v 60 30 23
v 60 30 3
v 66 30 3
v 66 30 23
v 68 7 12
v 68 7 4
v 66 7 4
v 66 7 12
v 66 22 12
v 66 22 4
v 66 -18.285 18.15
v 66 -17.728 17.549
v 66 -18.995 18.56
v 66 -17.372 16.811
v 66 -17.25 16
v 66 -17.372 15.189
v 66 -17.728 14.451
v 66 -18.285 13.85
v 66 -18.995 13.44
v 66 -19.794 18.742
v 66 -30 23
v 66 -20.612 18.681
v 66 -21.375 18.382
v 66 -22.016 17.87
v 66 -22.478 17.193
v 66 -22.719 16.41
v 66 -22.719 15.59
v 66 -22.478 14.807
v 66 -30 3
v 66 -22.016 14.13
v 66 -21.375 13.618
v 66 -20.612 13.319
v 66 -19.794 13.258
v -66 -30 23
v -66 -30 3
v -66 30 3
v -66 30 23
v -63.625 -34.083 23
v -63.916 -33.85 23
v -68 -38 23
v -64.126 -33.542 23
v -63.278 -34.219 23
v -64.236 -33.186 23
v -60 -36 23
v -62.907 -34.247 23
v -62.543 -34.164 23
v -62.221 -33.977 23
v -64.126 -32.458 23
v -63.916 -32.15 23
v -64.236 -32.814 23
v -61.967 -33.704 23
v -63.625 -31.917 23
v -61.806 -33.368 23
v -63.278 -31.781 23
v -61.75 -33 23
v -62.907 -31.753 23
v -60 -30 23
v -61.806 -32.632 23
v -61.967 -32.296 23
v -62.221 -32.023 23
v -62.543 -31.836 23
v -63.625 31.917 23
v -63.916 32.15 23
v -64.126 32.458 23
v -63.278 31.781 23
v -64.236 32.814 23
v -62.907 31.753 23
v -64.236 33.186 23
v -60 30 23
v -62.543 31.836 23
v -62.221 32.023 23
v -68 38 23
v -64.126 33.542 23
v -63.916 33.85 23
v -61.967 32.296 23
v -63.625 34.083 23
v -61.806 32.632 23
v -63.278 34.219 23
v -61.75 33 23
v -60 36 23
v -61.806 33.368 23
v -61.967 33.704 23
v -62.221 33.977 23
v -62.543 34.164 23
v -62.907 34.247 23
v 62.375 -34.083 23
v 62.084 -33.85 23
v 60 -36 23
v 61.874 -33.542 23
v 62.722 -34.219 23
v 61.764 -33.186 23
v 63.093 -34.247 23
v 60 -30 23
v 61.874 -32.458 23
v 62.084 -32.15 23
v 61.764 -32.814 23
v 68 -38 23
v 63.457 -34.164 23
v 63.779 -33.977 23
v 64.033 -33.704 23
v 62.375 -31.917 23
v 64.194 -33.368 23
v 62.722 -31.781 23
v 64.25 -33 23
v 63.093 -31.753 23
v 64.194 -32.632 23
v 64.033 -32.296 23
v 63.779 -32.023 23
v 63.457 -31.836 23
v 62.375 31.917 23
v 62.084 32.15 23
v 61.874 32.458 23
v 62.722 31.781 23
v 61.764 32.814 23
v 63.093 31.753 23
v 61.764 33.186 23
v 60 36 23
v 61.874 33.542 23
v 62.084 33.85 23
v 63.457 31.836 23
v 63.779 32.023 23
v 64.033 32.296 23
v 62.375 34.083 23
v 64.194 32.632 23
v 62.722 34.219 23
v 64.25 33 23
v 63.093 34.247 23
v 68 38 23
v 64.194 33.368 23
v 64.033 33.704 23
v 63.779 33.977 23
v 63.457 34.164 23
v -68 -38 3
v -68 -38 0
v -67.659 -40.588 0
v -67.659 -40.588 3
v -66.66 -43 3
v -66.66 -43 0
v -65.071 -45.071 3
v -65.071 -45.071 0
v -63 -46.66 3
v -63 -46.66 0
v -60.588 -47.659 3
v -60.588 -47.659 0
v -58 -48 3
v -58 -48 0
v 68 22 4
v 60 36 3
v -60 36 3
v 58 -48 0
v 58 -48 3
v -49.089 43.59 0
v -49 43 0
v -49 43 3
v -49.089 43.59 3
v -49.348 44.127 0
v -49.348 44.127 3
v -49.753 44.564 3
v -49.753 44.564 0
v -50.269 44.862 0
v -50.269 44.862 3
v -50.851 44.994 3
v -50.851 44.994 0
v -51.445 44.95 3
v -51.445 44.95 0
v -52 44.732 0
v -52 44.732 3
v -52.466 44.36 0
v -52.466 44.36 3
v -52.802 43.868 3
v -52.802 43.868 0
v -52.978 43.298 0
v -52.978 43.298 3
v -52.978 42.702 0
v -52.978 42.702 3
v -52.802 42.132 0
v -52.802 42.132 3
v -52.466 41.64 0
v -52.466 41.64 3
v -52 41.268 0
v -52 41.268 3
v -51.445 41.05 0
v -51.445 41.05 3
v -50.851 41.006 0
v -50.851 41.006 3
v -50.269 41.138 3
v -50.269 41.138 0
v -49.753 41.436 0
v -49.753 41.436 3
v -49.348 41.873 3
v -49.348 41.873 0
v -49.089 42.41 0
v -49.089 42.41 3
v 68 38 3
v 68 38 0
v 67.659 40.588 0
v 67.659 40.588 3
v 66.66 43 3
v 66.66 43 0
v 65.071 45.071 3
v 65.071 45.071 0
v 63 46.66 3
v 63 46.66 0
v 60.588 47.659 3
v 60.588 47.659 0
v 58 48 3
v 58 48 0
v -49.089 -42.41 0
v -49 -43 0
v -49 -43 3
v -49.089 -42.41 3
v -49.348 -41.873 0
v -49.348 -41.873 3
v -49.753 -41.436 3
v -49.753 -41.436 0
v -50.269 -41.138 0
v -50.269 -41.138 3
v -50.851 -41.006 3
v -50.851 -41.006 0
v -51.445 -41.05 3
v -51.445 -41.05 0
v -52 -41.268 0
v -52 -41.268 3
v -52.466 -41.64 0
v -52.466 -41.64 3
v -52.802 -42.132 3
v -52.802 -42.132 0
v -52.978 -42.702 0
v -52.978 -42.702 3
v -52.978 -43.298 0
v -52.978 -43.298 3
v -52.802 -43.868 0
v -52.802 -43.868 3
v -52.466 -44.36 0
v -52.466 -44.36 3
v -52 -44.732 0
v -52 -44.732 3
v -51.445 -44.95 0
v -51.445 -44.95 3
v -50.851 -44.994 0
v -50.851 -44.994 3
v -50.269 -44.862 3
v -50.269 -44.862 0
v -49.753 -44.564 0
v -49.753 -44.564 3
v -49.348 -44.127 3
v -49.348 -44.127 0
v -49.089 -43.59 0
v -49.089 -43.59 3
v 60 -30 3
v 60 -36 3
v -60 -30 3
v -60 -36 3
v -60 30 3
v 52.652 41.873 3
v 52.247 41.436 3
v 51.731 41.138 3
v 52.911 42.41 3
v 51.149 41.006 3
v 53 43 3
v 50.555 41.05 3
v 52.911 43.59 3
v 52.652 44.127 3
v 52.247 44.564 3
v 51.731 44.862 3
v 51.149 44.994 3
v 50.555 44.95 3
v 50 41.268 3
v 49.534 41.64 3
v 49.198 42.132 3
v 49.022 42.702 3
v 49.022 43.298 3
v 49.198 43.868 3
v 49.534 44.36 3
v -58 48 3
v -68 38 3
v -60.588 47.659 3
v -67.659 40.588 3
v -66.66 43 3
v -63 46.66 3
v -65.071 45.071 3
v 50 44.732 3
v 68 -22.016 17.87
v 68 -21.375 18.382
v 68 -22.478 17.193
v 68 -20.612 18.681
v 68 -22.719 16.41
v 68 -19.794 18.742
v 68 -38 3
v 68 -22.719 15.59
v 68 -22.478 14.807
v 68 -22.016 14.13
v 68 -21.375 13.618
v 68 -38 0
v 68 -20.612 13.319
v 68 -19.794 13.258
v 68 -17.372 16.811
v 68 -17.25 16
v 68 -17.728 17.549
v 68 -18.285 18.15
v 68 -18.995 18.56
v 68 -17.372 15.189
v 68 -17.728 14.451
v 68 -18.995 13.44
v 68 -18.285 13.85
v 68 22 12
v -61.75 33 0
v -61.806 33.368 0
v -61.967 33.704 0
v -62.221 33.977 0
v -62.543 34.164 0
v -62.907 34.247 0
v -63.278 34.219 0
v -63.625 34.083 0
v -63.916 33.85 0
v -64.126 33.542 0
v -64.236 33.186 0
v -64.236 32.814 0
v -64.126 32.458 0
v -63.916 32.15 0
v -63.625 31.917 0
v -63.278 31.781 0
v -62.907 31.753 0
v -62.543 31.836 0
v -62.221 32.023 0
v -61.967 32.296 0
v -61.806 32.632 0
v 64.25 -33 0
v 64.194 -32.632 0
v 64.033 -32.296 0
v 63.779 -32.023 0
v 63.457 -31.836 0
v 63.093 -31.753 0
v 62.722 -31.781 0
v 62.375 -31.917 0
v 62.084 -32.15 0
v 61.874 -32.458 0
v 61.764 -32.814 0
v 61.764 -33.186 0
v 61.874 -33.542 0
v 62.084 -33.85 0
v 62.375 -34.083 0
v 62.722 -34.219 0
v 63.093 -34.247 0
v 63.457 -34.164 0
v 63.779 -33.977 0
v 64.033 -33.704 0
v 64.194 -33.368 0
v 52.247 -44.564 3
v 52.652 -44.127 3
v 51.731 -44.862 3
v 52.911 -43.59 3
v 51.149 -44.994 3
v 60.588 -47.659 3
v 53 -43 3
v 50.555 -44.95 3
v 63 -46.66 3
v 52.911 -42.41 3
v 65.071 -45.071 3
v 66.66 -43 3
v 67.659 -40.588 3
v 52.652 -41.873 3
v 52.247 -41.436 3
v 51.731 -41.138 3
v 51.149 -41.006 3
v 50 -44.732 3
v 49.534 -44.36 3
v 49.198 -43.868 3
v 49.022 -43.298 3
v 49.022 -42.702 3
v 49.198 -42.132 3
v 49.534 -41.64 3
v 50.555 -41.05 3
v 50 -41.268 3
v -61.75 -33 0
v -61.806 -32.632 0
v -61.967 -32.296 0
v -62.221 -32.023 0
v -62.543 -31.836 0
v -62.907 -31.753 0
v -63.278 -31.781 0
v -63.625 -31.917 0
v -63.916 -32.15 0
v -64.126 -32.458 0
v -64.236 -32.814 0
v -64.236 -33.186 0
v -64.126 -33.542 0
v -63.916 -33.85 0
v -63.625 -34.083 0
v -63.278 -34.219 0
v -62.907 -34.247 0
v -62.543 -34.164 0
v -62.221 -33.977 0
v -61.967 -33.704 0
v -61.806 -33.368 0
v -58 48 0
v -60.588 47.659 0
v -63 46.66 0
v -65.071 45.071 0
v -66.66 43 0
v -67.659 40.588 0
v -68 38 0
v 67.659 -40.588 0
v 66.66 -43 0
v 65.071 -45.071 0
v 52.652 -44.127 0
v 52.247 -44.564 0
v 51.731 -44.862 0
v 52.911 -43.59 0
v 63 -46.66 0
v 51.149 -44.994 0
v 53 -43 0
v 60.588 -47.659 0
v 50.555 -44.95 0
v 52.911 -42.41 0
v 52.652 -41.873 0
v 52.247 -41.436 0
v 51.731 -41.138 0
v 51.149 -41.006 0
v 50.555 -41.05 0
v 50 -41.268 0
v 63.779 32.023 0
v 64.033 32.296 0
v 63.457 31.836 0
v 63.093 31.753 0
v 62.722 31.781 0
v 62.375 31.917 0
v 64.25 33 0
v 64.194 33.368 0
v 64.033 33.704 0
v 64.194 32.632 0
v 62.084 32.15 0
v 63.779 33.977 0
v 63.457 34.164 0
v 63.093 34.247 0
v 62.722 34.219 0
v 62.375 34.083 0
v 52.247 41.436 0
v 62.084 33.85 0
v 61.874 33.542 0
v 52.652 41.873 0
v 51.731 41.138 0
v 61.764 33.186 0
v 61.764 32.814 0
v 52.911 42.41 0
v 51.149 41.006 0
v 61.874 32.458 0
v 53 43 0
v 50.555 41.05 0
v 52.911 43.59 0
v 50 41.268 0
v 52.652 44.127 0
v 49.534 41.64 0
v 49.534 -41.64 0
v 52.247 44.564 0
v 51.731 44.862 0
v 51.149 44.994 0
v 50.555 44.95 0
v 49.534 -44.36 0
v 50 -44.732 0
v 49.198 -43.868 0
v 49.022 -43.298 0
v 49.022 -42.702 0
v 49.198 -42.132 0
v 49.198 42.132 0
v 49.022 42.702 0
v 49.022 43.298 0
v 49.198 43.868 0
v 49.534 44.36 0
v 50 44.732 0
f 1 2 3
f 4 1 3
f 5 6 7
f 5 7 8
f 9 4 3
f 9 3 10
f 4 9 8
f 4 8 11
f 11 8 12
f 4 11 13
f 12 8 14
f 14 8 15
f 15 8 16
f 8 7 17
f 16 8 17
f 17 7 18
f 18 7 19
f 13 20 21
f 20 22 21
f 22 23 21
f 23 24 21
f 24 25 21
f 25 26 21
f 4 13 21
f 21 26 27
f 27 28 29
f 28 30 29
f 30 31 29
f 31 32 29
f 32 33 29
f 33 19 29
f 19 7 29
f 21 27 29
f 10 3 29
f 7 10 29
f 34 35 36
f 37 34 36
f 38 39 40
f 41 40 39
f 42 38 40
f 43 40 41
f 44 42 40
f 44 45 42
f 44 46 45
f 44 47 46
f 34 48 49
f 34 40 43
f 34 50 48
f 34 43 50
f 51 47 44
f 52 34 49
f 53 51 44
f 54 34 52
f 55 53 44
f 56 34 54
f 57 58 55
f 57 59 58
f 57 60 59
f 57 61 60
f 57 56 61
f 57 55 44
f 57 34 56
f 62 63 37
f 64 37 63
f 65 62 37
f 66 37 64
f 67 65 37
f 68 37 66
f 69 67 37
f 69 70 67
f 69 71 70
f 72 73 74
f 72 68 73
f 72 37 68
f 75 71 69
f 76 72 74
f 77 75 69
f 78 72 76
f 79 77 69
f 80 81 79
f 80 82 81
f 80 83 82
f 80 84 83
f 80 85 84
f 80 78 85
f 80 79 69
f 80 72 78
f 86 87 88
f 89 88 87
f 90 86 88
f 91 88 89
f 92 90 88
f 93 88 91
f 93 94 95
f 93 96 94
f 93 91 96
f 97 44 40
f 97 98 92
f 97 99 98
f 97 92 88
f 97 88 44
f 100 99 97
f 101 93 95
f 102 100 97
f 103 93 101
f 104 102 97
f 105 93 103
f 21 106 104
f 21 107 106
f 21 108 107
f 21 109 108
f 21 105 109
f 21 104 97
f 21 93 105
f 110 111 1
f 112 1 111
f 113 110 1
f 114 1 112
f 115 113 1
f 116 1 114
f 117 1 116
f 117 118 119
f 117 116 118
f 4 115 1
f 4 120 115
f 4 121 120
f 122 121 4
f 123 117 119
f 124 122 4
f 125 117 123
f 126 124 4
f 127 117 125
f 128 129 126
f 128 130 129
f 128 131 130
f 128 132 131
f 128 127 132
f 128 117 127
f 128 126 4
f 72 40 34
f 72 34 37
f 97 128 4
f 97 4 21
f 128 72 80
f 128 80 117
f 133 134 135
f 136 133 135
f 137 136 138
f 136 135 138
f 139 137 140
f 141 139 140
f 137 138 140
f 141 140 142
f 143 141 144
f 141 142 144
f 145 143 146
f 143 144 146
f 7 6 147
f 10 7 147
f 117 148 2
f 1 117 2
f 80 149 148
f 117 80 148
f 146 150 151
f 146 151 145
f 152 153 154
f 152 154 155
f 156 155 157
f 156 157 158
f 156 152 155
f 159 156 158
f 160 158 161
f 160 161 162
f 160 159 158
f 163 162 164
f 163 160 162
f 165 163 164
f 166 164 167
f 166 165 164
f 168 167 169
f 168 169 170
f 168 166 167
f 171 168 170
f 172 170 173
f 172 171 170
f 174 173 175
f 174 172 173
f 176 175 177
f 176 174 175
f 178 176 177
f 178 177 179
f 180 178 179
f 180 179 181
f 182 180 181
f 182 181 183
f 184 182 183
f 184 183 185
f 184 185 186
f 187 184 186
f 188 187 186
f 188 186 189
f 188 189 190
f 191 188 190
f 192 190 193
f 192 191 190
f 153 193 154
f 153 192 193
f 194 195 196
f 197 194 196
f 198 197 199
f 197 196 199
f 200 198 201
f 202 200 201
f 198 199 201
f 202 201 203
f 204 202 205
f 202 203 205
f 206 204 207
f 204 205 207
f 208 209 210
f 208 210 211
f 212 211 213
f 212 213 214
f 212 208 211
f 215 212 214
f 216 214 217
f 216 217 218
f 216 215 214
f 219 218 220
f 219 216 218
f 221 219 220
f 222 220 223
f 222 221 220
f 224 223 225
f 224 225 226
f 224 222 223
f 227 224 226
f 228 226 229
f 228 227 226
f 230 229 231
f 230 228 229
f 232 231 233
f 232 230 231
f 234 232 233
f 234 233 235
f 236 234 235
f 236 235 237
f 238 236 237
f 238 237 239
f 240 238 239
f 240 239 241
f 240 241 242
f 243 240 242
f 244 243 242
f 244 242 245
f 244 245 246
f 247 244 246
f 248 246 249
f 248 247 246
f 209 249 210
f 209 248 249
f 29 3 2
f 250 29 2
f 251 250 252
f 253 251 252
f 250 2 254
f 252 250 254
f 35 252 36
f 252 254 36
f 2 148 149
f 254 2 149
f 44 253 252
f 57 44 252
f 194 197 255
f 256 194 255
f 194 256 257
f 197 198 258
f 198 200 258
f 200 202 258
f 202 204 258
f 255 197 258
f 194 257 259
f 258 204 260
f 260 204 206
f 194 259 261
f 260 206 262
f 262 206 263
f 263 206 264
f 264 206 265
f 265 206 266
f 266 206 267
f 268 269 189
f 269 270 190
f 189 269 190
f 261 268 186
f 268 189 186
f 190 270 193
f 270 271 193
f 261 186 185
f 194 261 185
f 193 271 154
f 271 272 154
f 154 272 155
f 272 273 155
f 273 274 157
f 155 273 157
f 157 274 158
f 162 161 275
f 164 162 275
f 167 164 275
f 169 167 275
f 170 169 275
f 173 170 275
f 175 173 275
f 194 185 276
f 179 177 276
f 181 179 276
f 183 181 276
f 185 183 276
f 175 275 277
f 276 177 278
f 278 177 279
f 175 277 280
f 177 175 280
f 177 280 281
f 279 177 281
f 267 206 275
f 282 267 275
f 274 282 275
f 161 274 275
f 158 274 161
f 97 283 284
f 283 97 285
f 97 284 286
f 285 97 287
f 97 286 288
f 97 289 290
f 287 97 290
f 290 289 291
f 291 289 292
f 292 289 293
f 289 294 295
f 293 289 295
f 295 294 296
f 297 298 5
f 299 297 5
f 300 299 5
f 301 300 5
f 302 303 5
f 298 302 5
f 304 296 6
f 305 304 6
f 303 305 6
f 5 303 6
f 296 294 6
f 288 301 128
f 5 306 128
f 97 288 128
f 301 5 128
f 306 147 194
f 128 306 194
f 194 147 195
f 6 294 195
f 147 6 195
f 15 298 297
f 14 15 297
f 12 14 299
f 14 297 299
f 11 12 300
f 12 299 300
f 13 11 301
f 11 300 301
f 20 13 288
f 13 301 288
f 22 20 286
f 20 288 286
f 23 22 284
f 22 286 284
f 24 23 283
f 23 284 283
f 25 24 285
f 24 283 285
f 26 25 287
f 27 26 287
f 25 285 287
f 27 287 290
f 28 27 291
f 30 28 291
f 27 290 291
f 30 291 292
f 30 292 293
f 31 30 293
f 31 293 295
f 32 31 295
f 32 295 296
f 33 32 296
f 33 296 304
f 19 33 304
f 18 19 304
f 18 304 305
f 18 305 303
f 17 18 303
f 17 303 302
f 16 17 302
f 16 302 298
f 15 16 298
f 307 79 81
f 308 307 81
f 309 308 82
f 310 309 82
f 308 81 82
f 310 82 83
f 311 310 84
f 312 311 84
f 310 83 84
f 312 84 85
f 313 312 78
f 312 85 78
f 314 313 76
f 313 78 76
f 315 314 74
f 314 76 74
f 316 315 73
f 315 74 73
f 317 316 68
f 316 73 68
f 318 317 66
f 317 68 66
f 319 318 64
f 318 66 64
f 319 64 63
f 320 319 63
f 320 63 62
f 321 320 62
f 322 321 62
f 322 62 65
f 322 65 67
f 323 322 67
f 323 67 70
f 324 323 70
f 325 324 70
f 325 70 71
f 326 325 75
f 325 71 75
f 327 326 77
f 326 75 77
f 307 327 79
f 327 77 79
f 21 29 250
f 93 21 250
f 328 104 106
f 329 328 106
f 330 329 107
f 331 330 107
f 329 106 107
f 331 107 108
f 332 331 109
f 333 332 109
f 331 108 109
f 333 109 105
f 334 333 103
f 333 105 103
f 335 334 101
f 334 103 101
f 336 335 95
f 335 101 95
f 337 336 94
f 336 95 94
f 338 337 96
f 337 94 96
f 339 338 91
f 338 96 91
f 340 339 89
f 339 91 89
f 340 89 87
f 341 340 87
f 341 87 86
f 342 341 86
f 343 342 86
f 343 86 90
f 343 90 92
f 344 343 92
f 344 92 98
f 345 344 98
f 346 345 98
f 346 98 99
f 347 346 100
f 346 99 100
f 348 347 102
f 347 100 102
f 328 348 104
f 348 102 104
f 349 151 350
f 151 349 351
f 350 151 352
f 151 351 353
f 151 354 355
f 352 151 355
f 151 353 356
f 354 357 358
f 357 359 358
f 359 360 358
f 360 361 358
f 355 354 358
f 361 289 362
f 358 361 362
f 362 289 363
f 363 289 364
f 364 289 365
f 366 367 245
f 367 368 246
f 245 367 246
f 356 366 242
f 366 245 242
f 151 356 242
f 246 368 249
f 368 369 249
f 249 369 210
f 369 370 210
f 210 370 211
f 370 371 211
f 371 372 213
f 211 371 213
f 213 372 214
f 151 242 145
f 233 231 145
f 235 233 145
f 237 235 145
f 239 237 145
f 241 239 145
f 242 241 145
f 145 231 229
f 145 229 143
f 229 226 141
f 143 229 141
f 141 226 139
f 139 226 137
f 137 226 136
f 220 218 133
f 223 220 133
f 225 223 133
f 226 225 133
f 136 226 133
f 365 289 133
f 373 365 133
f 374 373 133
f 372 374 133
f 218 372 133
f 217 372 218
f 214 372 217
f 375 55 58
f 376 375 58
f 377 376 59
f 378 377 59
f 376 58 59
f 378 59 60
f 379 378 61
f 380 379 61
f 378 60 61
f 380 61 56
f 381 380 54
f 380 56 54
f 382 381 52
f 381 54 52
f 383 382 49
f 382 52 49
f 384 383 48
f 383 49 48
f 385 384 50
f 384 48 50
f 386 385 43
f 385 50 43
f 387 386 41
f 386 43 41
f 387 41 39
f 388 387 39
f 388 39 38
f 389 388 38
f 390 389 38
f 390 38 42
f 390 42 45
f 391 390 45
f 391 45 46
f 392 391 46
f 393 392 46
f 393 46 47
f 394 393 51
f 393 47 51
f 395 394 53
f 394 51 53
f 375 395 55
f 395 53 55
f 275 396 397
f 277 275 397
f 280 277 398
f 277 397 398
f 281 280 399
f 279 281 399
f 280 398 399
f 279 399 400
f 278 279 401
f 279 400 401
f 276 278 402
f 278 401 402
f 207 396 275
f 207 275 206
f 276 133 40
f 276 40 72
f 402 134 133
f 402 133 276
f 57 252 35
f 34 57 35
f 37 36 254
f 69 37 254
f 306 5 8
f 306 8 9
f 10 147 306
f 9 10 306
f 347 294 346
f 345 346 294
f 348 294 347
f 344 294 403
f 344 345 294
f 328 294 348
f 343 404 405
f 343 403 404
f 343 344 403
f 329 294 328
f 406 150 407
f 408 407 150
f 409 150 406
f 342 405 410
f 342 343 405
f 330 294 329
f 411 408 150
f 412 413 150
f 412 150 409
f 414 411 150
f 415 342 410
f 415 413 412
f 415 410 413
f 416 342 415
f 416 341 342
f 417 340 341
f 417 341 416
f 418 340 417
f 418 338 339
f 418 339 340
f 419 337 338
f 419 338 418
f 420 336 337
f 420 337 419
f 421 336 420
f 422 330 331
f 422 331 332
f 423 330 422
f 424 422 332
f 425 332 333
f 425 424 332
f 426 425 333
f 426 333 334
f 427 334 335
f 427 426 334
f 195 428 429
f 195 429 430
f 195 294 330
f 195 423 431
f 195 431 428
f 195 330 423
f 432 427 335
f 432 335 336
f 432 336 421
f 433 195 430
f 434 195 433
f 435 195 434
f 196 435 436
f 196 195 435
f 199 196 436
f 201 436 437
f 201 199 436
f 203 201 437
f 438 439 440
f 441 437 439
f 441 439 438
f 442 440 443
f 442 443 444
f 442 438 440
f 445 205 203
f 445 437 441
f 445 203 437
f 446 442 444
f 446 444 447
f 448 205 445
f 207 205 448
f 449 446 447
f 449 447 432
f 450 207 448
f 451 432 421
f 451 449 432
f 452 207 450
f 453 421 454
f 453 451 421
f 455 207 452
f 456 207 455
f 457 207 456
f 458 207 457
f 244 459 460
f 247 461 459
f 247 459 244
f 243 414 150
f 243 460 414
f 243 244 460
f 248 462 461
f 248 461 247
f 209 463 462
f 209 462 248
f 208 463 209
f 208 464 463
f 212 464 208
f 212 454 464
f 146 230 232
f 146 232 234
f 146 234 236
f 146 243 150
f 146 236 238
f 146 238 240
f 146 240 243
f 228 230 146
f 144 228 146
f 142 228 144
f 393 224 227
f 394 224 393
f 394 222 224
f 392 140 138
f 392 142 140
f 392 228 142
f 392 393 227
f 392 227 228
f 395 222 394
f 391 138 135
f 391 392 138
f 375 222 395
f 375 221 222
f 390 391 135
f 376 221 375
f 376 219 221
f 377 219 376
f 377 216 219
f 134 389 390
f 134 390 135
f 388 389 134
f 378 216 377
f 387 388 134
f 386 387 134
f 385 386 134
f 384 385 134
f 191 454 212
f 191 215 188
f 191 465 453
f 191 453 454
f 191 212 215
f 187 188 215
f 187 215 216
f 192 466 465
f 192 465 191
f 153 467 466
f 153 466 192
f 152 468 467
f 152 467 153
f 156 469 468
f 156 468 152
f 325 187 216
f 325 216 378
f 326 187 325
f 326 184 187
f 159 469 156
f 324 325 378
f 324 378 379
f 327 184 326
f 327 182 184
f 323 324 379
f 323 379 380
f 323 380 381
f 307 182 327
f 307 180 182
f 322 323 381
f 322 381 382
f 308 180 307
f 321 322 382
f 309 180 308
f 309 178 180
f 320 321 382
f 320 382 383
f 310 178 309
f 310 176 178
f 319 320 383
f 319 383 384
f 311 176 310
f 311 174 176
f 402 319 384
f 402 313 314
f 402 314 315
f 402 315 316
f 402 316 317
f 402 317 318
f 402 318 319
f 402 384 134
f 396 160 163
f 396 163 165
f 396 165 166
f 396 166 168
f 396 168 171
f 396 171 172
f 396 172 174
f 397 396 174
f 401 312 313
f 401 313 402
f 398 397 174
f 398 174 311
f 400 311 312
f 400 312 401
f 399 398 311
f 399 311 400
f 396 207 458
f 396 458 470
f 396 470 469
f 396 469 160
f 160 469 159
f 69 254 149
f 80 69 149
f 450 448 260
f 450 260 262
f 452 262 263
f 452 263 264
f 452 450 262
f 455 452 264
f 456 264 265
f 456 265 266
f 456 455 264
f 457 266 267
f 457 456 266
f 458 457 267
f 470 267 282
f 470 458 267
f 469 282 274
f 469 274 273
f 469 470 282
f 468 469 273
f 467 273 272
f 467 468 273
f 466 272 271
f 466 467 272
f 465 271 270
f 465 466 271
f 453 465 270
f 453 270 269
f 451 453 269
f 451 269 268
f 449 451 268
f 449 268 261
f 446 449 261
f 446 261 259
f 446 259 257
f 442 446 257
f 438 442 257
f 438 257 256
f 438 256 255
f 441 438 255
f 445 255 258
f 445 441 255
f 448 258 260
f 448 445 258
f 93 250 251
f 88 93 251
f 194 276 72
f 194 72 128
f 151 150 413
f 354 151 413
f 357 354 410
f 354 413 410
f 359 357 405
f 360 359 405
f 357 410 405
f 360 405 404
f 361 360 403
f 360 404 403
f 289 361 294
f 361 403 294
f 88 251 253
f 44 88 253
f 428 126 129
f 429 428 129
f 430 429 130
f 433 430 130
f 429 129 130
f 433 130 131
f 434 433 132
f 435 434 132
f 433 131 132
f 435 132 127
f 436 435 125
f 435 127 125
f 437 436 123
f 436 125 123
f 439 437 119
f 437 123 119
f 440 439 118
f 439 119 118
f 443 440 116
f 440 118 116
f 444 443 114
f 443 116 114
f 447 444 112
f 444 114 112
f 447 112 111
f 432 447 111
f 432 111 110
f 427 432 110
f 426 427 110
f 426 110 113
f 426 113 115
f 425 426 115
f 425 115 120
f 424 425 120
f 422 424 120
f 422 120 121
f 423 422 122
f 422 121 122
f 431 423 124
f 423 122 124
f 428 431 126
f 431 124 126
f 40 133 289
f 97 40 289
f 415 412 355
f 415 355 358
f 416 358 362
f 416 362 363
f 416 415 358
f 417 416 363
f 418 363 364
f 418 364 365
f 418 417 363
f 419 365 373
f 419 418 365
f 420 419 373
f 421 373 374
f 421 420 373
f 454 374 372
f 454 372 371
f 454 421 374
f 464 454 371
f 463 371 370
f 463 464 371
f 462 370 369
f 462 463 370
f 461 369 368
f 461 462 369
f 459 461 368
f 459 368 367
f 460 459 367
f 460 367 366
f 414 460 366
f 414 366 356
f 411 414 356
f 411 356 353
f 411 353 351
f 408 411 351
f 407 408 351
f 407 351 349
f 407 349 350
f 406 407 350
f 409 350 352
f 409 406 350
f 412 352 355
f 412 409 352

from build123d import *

# Parameters (mm, degrees)
SKETCH_R        = 2
PAD_DEPTH       = 3
SKETCH001_W     = 136
SKETCH001_H     = 76
PAD001_DEPTH    = 20
SKETCH002_R     = 1.25
POCKET_DEPTH    = 23
SKETCH003_R     = 2.75
SKETCH003_W     = 15
SKETCH003_H     = 8
POCKET001_DEPTH = 5


with BuildPart() as part:
    # Sketch → Pad (new body)
    with BuildSketch(Plane.XY):
        with BuildLine():
            Line((-58, 48), (58, 48))
            ThreePointArc((68, 38), (65.071068, 45.071068), (58, 48))
            Line((68, 38), (68, -38))
            ThreePointArc((58, -48), (65.071068, -45.071068), (68, -38))
            Line((58, -48), (-58, -48))
            ThreePointArc((-68, -38), (-65.071068, -45.071068), (-58, -48))
            Line((-68, -38), (-68, 38))
            ThreePointArc((-58, 48), (-65.071068, 45.071068), (-68, 38))
        make_face()
        with Locations((-51, 43)):
            Circle(SKETCH_R, mode=Mode.SUBTRACT)
        with Locations((51, 43)):
            Circle(SKETCH_R, mode=Mode.SUBTRACT)
        with Locations((-51, -43)):
            Circle(SKETCH_R, mode=Mode.SUBTRACT)
        with Locations((51, -43)):
            Circle(SKETCH_R, mode=Mode.SUBTRACT)
    extrude(amount=PAD_DEPTH)

    # Sketch001 (on Face14 of Pad) → Pad001 (join)
    with BuildSketch(Plane.XY.offset(3)):
        Rectangle(SKETCH001_W, SKETCH001_H)
        Polygon((-60, 36), (60, 36), (60, 30), (66, 30), (66, -30), (60, -30), (60, -36), (-60, -36), (-60, -30), (-66, -30), (-66, 30), (-60, 30), align=None, mode=Mode.SUBTRACT)
    extrude(amount=PAD001_DEPTH)

    # Sketch002 → Pocket (cut)
    with BuildSketch(Plane.XY.offset(23)):
        with Locations((63, -33)):
            Circle(SKETCH002_R)
        with Locations((-63, -33)):
            Circle(SKETCH002_R)
        with Locations((-63, 33)):
            Circle(SKETCH002_R)
        with Locations((63, 33)):
            Circle(SKETCH002_R)
    extrude(amount=-POCKET_DEPTH, mode=Mode.SUBTRACT)

    # Sketch003 (on Face24 of Pocket) → Pocket001 (cut)
    with BuildSketch(Plane.YZ.offset(68)):
        with Locations((-20, 16)):
            Circle(SKETCH003_R)
        with Locations((14.5, 8)):
            Rectangle(SKETCH003_W, SKETCH003_H)
    extrude(amount=-POCKET001_DEPTH, mode=Mode.SUBTRACT)


solid = part.part
